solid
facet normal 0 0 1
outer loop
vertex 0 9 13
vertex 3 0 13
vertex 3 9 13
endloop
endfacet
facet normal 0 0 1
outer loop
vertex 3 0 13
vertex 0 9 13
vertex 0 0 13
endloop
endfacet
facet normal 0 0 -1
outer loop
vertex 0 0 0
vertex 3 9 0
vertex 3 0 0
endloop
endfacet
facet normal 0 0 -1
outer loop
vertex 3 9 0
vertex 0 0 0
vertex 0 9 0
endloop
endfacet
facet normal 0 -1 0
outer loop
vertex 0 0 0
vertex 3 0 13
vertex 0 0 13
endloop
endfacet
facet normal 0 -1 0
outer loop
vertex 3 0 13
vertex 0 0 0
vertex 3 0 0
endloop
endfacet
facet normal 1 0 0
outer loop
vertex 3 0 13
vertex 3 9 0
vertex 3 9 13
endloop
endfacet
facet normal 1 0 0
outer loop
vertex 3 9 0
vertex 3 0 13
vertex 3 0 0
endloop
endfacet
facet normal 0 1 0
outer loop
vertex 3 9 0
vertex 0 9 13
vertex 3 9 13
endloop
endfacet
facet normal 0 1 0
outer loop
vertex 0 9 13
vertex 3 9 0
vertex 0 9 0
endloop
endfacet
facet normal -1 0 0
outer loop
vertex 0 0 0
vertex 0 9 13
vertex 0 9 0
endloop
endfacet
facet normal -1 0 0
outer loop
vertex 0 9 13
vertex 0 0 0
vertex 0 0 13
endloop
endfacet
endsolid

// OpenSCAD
// Generated by SolidPython 1.0.1 on 2020-07-29 00:39:26


cube(size = [3, 9, 13]);
/***********************************************
*********      SolidPython code:      **********
************************************************
 
# import packages: SolidPython
from solid import *
from solid.utils import *
from itertools import chain, combinations


class Resize:

    def __init__(self, scad_file):
        self.scad_file = scad_file
        #self.scad_file = import_scad(scad_file)
        # cone/cylinder param:
        self.r1 = 0
        self.r2 = 0
        self.h = 0
        # rectangular prism param:
        self.w = 0
        self.l = 0
        # ellipse param:
        self.r = 0

    # import OpenScad code (file name corresponds to shape)


    # classify shape + parameters
    def assign(self, param1, param2, param3):
        if self.scad_file == 'cone.scad':
            self.r1 = param1
            self.r2 = param2
            self.h = param3
        elif self.scad_file == 'cylinder.scad':
            self.r1 = param1
            self.r2 = param2
            self.h = param3
        elif self.scad_file == 'rectangularPrism.scad':
            self.h = param1
            self.l = param2
            self.w = param3
        else:
            self.r = param1
            self.h = param2

    # resize parameters
    def iterate(self):
        x = range(3, 20, 2)
        i = 1
        if self.scad_file == 'cone.scad':
            tempList = list(combinations(x, 2))
            for temp in tempList:
                param1 = temp[0]
                param2 = temp[1]
                filepath = 'produced_scad_files/' + 'cone' + str(param1) + '_' + str(param2) + '_' + '.scad'
                scad_render_to_file(cylinder(h=param1, r1=param2, r2=0), filepath)

        elif self.scad_file == 'cylinder.scad':
            tempList = list(combinations(x, 3))
            for temp in tempList:
                param1 = temp[0]
                param2 = temp[1]
                filepath = 'produced_scad_files/' + 'cylinder' + str(param1) + '_' + str(param2) + '_' + '.scad'
                scad_render_to_file(cylinder(h=param1, r1=param2, r2=param2), filepath)

        elif self.scad_file == 'rectangularPrism.scad':
            tempList = list(combinations(x, 3))
            for temp in tempList:
                param1 = temp[0]
                param2 = temp[1]
                param3 = temp[2]
                filepath = 'produced_scad_files/' + 'rectangularPrism' + str(param1) + '_' + str(param2) + '_' + str(
                    param3) + '.scad'
                scad_render_to_file(cube(size=(param1, param2, param3)), filepath)

        elif self.scad_file == 'ellipse.scad':
            tempList = list(combinations(x, 4))
            for temp in tempList:
                param1 = temp[0]
                param2 = temp[1]
                param3 = temp[2]
                param4 = temp[3]
                filepath = 'produced_scad_files/' + 'ellipse' + str(param1) + '_' + str(param2) + '_' + str(param3) + '_' + str(param4) + '.scad'
                scad_render_to_file(scale([param1, param2, param3])(sphere(r=param4)), filepath)

    def render_to_scadfile(self):
        scad_render_to_file(scad, 'example.scad') 
 
************************************************/
